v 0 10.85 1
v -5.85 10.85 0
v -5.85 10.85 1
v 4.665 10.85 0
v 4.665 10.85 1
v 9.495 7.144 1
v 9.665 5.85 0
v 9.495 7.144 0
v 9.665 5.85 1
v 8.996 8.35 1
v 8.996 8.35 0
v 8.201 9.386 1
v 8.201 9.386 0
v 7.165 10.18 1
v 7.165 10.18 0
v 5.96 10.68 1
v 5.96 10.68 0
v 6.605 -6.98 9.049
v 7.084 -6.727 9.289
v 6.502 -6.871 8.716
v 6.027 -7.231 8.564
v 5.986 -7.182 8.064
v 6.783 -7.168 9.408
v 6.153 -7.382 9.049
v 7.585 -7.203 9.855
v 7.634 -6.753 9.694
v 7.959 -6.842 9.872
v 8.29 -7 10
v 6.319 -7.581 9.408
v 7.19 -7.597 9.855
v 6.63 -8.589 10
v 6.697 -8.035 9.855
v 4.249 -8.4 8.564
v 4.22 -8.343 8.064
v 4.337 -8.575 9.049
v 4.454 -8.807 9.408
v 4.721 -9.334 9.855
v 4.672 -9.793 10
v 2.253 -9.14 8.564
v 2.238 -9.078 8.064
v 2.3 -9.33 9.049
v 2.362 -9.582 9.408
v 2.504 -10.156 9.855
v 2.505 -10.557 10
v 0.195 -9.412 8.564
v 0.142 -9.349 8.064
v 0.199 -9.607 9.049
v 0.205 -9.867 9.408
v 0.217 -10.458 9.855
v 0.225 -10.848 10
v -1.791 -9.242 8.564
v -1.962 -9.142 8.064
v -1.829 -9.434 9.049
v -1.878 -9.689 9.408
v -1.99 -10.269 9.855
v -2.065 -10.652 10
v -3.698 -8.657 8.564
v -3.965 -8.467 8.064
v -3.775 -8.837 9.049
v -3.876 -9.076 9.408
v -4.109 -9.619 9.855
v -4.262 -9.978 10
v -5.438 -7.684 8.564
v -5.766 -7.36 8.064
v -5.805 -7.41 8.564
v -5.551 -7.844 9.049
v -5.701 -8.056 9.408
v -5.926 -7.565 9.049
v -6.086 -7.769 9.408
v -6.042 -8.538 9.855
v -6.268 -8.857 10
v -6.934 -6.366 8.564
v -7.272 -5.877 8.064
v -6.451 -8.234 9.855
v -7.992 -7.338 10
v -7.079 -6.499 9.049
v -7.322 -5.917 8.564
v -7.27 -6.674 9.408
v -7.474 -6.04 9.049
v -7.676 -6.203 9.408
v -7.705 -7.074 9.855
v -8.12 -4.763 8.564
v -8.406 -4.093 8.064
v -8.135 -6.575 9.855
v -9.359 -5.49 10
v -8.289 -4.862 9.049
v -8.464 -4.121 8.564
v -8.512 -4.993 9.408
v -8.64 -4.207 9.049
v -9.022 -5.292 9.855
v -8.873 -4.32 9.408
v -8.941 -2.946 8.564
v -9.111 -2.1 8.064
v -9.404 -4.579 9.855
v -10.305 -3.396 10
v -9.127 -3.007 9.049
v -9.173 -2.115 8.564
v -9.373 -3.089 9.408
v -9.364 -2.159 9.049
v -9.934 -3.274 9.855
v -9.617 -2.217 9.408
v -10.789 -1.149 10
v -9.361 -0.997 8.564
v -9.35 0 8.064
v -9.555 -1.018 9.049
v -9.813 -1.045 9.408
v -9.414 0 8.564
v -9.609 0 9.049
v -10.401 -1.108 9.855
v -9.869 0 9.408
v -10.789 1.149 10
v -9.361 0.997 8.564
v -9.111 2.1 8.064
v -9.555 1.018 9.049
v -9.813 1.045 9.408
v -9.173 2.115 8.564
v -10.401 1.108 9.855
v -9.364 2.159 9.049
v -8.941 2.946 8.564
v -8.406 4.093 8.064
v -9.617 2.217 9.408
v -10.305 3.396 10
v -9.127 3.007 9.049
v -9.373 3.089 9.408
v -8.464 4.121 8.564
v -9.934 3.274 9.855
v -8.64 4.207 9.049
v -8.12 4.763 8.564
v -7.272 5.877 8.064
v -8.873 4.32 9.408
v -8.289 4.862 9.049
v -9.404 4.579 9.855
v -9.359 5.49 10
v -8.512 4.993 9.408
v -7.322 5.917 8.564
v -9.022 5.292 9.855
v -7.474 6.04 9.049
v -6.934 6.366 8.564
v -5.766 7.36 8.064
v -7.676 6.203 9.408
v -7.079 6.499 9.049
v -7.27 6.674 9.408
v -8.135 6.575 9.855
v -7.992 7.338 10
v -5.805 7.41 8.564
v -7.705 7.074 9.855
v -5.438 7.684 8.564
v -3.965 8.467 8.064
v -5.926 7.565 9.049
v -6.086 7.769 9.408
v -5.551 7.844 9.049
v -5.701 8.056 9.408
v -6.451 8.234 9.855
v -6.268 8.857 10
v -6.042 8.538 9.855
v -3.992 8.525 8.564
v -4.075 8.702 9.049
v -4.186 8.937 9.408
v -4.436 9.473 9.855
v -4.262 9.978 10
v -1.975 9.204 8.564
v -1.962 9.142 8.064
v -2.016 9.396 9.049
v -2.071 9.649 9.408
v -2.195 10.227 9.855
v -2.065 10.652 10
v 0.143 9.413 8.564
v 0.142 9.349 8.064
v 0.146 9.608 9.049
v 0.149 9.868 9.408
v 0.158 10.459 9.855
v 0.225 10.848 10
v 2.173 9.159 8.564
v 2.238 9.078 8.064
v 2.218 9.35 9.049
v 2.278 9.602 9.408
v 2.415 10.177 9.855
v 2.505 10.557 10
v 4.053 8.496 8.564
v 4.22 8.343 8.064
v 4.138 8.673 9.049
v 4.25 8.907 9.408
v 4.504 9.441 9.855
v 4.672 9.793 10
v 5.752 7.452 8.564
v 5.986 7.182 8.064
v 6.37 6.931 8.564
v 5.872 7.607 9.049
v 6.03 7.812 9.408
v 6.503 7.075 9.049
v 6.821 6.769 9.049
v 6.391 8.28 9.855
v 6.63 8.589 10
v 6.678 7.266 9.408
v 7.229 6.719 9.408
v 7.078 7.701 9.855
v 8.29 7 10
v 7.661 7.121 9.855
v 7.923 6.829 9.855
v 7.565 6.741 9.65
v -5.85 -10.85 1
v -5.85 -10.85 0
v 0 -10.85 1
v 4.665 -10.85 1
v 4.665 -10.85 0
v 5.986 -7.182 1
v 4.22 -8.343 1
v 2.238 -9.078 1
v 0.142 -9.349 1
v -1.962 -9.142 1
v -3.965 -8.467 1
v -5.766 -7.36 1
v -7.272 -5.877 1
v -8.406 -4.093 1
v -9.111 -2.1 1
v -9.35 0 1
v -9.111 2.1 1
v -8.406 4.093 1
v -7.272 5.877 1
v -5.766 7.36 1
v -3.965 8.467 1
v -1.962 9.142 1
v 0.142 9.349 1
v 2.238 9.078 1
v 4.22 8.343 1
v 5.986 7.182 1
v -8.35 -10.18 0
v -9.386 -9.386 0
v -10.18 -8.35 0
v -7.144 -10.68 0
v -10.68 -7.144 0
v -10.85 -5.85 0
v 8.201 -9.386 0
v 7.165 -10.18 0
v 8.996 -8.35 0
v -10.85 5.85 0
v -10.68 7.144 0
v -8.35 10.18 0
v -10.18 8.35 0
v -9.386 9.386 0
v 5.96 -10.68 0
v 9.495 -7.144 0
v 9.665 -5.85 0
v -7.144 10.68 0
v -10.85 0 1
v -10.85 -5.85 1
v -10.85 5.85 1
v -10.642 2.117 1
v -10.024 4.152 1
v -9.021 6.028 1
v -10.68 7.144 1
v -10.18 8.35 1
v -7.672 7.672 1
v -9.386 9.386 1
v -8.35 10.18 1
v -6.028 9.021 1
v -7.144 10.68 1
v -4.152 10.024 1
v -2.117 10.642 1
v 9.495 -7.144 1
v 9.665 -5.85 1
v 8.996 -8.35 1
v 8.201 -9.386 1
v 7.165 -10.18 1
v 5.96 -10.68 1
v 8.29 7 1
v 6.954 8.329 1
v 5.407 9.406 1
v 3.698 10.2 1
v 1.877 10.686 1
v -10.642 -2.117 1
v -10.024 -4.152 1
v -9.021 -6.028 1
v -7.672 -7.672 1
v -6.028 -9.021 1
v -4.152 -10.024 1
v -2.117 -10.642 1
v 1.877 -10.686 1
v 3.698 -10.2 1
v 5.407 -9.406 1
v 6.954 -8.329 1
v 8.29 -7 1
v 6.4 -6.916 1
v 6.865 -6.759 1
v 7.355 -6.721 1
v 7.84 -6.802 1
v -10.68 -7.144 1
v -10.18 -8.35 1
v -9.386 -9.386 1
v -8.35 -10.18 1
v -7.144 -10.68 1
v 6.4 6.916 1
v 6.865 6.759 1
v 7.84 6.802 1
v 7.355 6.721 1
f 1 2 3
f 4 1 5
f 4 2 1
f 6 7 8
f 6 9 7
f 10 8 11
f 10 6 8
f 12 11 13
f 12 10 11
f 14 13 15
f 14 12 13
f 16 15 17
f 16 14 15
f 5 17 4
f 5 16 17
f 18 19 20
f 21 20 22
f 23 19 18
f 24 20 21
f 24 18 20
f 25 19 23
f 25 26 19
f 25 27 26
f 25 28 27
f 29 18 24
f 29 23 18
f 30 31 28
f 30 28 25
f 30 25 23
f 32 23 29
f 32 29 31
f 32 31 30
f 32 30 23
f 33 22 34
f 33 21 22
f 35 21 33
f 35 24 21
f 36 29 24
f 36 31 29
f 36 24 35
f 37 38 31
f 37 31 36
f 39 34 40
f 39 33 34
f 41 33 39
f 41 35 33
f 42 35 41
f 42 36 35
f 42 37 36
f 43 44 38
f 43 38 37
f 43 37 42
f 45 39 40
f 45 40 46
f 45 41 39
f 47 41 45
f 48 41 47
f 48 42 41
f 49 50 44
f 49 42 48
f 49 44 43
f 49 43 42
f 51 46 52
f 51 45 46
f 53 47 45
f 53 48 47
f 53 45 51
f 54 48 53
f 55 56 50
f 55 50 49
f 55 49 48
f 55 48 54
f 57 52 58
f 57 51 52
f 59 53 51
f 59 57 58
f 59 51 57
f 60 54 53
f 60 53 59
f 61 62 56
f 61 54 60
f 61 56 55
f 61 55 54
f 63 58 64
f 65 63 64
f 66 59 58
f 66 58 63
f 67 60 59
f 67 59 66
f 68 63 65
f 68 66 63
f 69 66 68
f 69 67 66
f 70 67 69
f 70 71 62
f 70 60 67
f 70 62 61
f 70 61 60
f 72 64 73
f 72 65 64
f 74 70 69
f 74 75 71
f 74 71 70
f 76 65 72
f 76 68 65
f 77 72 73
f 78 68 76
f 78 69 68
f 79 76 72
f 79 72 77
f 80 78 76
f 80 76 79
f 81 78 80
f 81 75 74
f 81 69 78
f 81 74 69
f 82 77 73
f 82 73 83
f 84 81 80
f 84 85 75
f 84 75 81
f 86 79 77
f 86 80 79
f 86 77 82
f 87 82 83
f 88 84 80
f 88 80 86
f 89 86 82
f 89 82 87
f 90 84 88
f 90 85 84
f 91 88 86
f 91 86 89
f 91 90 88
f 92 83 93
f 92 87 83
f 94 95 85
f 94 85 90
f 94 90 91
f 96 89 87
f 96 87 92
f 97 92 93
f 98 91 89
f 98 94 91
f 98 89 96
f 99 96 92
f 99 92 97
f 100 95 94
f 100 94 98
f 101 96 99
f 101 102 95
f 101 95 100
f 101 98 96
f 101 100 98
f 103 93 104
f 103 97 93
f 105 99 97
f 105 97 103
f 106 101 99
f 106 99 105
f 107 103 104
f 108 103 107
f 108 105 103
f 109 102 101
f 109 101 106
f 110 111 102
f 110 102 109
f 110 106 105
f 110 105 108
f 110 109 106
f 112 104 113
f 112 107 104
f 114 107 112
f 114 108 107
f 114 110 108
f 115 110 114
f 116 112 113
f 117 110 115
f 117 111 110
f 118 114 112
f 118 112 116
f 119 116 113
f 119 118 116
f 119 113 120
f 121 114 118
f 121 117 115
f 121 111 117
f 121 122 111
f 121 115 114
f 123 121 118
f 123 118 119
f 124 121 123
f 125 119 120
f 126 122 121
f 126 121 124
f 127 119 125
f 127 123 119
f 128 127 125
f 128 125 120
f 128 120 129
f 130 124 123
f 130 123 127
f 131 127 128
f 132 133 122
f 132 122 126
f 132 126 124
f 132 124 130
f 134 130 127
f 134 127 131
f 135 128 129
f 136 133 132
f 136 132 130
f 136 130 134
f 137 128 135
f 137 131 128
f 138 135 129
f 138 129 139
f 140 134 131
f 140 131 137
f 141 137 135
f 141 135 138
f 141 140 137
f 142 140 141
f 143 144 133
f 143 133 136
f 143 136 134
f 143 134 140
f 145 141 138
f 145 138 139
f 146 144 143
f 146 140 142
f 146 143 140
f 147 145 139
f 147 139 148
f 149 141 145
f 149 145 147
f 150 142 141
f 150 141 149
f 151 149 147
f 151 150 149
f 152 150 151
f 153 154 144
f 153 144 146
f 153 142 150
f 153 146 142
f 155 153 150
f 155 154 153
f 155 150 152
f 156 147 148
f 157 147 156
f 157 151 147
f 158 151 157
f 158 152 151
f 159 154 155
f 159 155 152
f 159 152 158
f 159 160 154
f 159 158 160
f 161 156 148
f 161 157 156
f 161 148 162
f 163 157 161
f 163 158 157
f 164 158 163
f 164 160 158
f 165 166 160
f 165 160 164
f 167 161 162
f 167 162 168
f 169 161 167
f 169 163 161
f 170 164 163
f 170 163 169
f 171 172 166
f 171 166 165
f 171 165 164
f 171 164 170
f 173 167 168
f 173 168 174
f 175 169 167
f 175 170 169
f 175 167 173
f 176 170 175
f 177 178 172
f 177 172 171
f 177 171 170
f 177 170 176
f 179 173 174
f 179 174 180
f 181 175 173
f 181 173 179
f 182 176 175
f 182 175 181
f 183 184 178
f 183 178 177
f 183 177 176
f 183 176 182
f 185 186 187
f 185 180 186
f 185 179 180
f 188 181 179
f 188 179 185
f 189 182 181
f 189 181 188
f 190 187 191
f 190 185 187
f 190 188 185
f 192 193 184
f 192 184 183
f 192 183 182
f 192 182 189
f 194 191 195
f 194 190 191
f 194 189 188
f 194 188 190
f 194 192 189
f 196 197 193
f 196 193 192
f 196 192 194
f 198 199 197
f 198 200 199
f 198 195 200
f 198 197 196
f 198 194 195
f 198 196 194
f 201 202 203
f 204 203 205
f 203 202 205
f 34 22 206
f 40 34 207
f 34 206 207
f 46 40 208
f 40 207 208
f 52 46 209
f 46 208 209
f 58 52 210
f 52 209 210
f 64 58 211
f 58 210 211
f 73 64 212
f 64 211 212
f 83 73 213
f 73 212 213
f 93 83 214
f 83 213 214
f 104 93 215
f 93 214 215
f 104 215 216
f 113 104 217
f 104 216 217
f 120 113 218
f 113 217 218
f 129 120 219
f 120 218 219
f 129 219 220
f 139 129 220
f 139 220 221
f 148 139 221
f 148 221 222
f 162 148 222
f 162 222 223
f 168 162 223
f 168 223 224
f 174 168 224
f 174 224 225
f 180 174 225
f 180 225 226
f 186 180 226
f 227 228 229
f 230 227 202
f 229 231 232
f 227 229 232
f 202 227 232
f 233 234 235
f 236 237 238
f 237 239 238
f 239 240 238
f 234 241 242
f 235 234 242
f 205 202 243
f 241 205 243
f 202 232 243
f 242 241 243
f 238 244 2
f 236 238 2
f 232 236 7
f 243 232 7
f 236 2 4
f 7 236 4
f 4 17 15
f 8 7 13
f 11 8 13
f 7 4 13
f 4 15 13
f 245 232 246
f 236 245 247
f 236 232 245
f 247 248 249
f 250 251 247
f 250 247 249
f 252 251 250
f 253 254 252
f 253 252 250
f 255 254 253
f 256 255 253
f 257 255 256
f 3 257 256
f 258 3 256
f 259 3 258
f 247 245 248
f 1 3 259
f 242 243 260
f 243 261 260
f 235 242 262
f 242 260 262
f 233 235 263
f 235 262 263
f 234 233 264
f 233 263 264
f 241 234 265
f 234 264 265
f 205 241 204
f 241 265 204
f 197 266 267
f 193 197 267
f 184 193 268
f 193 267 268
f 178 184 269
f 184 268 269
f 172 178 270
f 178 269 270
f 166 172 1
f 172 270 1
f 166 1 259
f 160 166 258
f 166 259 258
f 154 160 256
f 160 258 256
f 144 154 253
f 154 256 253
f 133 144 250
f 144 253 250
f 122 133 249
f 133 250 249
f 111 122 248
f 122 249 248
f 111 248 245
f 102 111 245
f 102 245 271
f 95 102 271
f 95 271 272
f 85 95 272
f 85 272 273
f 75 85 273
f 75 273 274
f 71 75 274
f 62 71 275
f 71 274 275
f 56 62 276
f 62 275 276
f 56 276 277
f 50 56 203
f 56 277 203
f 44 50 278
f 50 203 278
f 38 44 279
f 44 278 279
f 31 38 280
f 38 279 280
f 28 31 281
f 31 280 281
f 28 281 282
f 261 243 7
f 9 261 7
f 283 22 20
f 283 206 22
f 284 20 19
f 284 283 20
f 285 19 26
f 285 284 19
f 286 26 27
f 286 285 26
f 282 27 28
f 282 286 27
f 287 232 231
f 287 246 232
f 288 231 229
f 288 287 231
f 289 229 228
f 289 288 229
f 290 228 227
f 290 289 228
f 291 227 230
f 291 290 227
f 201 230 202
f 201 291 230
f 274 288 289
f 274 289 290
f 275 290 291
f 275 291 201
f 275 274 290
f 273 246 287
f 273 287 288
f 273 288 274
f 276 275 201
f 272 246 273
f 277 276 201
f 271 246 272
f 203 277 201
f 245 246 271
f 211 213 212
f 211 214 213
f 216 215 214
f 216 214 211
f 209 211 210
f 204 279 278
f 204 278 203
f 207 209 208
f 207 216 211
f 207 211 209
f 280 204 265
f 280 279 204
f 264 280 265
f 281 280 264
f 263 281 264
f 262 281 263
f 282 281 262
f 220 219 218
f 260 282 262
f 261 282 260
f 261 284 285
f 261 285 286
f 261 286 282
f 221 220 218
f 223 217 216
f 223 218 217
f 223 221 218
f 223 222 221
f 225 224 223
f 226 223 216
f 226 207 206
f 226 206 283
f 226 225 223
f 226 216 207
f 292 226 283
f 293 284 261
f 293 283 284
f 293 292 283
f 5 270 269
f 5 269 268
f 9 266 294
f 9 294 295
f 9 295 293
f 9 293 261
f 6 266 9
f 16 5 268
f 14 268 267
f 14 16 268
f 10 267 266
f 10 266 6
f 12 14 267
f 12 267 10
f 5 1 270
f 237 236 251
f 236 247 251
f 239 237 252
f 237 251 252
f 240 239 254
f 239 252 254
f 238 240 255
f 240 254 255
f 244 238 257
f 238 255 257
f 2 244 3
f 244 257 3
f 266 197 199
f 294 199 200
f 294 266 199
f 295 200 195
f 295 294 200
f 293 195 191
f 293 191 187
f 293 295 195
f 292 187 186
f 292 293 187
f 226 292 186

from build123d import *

# Parameters (mm, degrees)
F2_DEPTH    = 10
F3_W        = 20.5154874287
F3_H        = 21.7
F4_DEPTH    = 1
F5_R        = 5
F7_T1_DEPTH = 14.7609215151
F7_T4_ANGLE = 34.9116466648
F7_T6_ANGLE = 279.6444662417
F7_T8_ANGLE = 34.9116520269


# Not quite as in the source:
# - a fillet or chamfer that OpenCascade refuses, or shapes differently, is made with other operations: its cross-section is extruded or revolved along the edge and cut away or added


with BuildPart() as f2:
    # F0 (on Top) → F2 (new body)
    with BuildSketch(Plane.XY):
        with BuildLine():
            ThreePointArc((7.5612498967, -5.5), (-9.35, 0), (7.5612498967, 5.5))
            Line((7.5612498967, 5.5), (8.2899034976, 7))
            ThreePointArc((8.2899034976, 7), (-10.85, 0), (8.2899034976, -7))
            Line((8.2899034976, -7), (7.5612498967, -5.5))
        make_face()
    extrude(amount=F2_DEPTH)

    # F3 (on Top) → F4 (join)
    with BuildSketch(Plane.XY):
        with Locations((-0.5922562857, 0)):
            Rectangle(F3_W, F3_H)
    extrude(amount=F4_DEPTH)

    # F5
    f5_edges = [f2.edges().sort_by_distance(p)[0] for p in [
        (-10.85, -10.85, 0.5),
        (9.665487, -10.85, 0.5),
        (-10.85, 10.85, 0.5),
        (9.665487, 10.85, 0.5),
    ]]
    fillet(f5_edges, radius=F5_R)

    # F7: fillet of radius 2 on 3 edges, made by hand

    # F7_s2 → F7_t1 (cut)
    with BuildSketch(Plane.XY.offset(1)):
        with BuildLine():
            ThreePointArc((8.2899034976, 7), (7.1091806232, 6.7248281543), (5.9864319049, 7.1822790985))
            ThreePointArc((5.9864319049, 7.1822790985), (6.8258652411, 6.3898406639), (7.5612498967, 5.5))
            Line((7.5612498967, 5.5), (8.2899034976, 7))
        make_face()
        with BuildLine():
            ThreePointArc((5.9864319049, -7.1822790985), (7.1091806232, -6.7248281543), (8.2899034976, -7))
            Line((8.2899034976, -7), (7.5612498967, -5.5))
            ThreePointArc((7.5612498967, -5.5), (6.8258652411, -6.3898406639), (5.9864319049, -7.1822790985))
        make_face()
    extrude(amount=F7_T1_DEPTH, mode=Mode.SUBTRACT)

    # F7_s3 → F7_t4 (revolve, cut)
    with BuildSketch(Plane(origin=(0, 0, 0), x_dir=(0, 0, 1), z_dir=(0.091781739, 0.9957791484, 0))):
        with BuildLine():
            ThreePointArc((8, 9.35), (9.4142135624, 9.9357864376), (10, 11.35))
            Line((10, 11.35), (10, 9.35))
            Line((10, 9.35), (8, 9.35))
        make_face()
    revolve(axis=Axis((0, 0, 10), (0, 0, -1)), revolution_arc=F7_T4_ANGLE, mode=Mode.SUBTRACT)

    # F7_s5 → F7_t6 (revolve, cut)
    with BuildSketch(Plane(origin=(0, 0, 0), x_dir=(0, 0, 1), z_dir=(0.6451612191, 0.7640464655, 0))):
        with BuildLine():
            ThreePointArc((8.0635083269, 9.35), (9.2882531983, 9.7688611699), (10, 10.85))
            Line((10, 10.85), (10, 9.35))
            Line((10, 9.35), (8.0635083269, 9.35))
        make_face()
    revolve(axis=Axis((0, 0, 10), (0, 0, -1)), revolution_arc=F7_T6_ANGLE, mode=Mode.SUBTRACT)

    # F7_s7 → F7_t8 (revolve, cut)
    with BuildSketch(Plane(origin=(0, 0, 0), x_dir=(0, 0, 1), z_dir=(-0.6451612906, 0.7640464051, 0))):
        with BuildLine():
            ThreePointArc((8, 9.35), (9.4142135624, 9.9357864376), (10, 11.35))
            Line((10, 11.35), (10, 9.35))
            Line((10, 9.35), (8, 9.35))
        make_face()
    revolve(axis=Axis((0, 0, 10), (0, 0, -1)), revolution_arc=F7_T8_ANGLE, mode=Mode.SUBTRACT)


solid = f2.part
